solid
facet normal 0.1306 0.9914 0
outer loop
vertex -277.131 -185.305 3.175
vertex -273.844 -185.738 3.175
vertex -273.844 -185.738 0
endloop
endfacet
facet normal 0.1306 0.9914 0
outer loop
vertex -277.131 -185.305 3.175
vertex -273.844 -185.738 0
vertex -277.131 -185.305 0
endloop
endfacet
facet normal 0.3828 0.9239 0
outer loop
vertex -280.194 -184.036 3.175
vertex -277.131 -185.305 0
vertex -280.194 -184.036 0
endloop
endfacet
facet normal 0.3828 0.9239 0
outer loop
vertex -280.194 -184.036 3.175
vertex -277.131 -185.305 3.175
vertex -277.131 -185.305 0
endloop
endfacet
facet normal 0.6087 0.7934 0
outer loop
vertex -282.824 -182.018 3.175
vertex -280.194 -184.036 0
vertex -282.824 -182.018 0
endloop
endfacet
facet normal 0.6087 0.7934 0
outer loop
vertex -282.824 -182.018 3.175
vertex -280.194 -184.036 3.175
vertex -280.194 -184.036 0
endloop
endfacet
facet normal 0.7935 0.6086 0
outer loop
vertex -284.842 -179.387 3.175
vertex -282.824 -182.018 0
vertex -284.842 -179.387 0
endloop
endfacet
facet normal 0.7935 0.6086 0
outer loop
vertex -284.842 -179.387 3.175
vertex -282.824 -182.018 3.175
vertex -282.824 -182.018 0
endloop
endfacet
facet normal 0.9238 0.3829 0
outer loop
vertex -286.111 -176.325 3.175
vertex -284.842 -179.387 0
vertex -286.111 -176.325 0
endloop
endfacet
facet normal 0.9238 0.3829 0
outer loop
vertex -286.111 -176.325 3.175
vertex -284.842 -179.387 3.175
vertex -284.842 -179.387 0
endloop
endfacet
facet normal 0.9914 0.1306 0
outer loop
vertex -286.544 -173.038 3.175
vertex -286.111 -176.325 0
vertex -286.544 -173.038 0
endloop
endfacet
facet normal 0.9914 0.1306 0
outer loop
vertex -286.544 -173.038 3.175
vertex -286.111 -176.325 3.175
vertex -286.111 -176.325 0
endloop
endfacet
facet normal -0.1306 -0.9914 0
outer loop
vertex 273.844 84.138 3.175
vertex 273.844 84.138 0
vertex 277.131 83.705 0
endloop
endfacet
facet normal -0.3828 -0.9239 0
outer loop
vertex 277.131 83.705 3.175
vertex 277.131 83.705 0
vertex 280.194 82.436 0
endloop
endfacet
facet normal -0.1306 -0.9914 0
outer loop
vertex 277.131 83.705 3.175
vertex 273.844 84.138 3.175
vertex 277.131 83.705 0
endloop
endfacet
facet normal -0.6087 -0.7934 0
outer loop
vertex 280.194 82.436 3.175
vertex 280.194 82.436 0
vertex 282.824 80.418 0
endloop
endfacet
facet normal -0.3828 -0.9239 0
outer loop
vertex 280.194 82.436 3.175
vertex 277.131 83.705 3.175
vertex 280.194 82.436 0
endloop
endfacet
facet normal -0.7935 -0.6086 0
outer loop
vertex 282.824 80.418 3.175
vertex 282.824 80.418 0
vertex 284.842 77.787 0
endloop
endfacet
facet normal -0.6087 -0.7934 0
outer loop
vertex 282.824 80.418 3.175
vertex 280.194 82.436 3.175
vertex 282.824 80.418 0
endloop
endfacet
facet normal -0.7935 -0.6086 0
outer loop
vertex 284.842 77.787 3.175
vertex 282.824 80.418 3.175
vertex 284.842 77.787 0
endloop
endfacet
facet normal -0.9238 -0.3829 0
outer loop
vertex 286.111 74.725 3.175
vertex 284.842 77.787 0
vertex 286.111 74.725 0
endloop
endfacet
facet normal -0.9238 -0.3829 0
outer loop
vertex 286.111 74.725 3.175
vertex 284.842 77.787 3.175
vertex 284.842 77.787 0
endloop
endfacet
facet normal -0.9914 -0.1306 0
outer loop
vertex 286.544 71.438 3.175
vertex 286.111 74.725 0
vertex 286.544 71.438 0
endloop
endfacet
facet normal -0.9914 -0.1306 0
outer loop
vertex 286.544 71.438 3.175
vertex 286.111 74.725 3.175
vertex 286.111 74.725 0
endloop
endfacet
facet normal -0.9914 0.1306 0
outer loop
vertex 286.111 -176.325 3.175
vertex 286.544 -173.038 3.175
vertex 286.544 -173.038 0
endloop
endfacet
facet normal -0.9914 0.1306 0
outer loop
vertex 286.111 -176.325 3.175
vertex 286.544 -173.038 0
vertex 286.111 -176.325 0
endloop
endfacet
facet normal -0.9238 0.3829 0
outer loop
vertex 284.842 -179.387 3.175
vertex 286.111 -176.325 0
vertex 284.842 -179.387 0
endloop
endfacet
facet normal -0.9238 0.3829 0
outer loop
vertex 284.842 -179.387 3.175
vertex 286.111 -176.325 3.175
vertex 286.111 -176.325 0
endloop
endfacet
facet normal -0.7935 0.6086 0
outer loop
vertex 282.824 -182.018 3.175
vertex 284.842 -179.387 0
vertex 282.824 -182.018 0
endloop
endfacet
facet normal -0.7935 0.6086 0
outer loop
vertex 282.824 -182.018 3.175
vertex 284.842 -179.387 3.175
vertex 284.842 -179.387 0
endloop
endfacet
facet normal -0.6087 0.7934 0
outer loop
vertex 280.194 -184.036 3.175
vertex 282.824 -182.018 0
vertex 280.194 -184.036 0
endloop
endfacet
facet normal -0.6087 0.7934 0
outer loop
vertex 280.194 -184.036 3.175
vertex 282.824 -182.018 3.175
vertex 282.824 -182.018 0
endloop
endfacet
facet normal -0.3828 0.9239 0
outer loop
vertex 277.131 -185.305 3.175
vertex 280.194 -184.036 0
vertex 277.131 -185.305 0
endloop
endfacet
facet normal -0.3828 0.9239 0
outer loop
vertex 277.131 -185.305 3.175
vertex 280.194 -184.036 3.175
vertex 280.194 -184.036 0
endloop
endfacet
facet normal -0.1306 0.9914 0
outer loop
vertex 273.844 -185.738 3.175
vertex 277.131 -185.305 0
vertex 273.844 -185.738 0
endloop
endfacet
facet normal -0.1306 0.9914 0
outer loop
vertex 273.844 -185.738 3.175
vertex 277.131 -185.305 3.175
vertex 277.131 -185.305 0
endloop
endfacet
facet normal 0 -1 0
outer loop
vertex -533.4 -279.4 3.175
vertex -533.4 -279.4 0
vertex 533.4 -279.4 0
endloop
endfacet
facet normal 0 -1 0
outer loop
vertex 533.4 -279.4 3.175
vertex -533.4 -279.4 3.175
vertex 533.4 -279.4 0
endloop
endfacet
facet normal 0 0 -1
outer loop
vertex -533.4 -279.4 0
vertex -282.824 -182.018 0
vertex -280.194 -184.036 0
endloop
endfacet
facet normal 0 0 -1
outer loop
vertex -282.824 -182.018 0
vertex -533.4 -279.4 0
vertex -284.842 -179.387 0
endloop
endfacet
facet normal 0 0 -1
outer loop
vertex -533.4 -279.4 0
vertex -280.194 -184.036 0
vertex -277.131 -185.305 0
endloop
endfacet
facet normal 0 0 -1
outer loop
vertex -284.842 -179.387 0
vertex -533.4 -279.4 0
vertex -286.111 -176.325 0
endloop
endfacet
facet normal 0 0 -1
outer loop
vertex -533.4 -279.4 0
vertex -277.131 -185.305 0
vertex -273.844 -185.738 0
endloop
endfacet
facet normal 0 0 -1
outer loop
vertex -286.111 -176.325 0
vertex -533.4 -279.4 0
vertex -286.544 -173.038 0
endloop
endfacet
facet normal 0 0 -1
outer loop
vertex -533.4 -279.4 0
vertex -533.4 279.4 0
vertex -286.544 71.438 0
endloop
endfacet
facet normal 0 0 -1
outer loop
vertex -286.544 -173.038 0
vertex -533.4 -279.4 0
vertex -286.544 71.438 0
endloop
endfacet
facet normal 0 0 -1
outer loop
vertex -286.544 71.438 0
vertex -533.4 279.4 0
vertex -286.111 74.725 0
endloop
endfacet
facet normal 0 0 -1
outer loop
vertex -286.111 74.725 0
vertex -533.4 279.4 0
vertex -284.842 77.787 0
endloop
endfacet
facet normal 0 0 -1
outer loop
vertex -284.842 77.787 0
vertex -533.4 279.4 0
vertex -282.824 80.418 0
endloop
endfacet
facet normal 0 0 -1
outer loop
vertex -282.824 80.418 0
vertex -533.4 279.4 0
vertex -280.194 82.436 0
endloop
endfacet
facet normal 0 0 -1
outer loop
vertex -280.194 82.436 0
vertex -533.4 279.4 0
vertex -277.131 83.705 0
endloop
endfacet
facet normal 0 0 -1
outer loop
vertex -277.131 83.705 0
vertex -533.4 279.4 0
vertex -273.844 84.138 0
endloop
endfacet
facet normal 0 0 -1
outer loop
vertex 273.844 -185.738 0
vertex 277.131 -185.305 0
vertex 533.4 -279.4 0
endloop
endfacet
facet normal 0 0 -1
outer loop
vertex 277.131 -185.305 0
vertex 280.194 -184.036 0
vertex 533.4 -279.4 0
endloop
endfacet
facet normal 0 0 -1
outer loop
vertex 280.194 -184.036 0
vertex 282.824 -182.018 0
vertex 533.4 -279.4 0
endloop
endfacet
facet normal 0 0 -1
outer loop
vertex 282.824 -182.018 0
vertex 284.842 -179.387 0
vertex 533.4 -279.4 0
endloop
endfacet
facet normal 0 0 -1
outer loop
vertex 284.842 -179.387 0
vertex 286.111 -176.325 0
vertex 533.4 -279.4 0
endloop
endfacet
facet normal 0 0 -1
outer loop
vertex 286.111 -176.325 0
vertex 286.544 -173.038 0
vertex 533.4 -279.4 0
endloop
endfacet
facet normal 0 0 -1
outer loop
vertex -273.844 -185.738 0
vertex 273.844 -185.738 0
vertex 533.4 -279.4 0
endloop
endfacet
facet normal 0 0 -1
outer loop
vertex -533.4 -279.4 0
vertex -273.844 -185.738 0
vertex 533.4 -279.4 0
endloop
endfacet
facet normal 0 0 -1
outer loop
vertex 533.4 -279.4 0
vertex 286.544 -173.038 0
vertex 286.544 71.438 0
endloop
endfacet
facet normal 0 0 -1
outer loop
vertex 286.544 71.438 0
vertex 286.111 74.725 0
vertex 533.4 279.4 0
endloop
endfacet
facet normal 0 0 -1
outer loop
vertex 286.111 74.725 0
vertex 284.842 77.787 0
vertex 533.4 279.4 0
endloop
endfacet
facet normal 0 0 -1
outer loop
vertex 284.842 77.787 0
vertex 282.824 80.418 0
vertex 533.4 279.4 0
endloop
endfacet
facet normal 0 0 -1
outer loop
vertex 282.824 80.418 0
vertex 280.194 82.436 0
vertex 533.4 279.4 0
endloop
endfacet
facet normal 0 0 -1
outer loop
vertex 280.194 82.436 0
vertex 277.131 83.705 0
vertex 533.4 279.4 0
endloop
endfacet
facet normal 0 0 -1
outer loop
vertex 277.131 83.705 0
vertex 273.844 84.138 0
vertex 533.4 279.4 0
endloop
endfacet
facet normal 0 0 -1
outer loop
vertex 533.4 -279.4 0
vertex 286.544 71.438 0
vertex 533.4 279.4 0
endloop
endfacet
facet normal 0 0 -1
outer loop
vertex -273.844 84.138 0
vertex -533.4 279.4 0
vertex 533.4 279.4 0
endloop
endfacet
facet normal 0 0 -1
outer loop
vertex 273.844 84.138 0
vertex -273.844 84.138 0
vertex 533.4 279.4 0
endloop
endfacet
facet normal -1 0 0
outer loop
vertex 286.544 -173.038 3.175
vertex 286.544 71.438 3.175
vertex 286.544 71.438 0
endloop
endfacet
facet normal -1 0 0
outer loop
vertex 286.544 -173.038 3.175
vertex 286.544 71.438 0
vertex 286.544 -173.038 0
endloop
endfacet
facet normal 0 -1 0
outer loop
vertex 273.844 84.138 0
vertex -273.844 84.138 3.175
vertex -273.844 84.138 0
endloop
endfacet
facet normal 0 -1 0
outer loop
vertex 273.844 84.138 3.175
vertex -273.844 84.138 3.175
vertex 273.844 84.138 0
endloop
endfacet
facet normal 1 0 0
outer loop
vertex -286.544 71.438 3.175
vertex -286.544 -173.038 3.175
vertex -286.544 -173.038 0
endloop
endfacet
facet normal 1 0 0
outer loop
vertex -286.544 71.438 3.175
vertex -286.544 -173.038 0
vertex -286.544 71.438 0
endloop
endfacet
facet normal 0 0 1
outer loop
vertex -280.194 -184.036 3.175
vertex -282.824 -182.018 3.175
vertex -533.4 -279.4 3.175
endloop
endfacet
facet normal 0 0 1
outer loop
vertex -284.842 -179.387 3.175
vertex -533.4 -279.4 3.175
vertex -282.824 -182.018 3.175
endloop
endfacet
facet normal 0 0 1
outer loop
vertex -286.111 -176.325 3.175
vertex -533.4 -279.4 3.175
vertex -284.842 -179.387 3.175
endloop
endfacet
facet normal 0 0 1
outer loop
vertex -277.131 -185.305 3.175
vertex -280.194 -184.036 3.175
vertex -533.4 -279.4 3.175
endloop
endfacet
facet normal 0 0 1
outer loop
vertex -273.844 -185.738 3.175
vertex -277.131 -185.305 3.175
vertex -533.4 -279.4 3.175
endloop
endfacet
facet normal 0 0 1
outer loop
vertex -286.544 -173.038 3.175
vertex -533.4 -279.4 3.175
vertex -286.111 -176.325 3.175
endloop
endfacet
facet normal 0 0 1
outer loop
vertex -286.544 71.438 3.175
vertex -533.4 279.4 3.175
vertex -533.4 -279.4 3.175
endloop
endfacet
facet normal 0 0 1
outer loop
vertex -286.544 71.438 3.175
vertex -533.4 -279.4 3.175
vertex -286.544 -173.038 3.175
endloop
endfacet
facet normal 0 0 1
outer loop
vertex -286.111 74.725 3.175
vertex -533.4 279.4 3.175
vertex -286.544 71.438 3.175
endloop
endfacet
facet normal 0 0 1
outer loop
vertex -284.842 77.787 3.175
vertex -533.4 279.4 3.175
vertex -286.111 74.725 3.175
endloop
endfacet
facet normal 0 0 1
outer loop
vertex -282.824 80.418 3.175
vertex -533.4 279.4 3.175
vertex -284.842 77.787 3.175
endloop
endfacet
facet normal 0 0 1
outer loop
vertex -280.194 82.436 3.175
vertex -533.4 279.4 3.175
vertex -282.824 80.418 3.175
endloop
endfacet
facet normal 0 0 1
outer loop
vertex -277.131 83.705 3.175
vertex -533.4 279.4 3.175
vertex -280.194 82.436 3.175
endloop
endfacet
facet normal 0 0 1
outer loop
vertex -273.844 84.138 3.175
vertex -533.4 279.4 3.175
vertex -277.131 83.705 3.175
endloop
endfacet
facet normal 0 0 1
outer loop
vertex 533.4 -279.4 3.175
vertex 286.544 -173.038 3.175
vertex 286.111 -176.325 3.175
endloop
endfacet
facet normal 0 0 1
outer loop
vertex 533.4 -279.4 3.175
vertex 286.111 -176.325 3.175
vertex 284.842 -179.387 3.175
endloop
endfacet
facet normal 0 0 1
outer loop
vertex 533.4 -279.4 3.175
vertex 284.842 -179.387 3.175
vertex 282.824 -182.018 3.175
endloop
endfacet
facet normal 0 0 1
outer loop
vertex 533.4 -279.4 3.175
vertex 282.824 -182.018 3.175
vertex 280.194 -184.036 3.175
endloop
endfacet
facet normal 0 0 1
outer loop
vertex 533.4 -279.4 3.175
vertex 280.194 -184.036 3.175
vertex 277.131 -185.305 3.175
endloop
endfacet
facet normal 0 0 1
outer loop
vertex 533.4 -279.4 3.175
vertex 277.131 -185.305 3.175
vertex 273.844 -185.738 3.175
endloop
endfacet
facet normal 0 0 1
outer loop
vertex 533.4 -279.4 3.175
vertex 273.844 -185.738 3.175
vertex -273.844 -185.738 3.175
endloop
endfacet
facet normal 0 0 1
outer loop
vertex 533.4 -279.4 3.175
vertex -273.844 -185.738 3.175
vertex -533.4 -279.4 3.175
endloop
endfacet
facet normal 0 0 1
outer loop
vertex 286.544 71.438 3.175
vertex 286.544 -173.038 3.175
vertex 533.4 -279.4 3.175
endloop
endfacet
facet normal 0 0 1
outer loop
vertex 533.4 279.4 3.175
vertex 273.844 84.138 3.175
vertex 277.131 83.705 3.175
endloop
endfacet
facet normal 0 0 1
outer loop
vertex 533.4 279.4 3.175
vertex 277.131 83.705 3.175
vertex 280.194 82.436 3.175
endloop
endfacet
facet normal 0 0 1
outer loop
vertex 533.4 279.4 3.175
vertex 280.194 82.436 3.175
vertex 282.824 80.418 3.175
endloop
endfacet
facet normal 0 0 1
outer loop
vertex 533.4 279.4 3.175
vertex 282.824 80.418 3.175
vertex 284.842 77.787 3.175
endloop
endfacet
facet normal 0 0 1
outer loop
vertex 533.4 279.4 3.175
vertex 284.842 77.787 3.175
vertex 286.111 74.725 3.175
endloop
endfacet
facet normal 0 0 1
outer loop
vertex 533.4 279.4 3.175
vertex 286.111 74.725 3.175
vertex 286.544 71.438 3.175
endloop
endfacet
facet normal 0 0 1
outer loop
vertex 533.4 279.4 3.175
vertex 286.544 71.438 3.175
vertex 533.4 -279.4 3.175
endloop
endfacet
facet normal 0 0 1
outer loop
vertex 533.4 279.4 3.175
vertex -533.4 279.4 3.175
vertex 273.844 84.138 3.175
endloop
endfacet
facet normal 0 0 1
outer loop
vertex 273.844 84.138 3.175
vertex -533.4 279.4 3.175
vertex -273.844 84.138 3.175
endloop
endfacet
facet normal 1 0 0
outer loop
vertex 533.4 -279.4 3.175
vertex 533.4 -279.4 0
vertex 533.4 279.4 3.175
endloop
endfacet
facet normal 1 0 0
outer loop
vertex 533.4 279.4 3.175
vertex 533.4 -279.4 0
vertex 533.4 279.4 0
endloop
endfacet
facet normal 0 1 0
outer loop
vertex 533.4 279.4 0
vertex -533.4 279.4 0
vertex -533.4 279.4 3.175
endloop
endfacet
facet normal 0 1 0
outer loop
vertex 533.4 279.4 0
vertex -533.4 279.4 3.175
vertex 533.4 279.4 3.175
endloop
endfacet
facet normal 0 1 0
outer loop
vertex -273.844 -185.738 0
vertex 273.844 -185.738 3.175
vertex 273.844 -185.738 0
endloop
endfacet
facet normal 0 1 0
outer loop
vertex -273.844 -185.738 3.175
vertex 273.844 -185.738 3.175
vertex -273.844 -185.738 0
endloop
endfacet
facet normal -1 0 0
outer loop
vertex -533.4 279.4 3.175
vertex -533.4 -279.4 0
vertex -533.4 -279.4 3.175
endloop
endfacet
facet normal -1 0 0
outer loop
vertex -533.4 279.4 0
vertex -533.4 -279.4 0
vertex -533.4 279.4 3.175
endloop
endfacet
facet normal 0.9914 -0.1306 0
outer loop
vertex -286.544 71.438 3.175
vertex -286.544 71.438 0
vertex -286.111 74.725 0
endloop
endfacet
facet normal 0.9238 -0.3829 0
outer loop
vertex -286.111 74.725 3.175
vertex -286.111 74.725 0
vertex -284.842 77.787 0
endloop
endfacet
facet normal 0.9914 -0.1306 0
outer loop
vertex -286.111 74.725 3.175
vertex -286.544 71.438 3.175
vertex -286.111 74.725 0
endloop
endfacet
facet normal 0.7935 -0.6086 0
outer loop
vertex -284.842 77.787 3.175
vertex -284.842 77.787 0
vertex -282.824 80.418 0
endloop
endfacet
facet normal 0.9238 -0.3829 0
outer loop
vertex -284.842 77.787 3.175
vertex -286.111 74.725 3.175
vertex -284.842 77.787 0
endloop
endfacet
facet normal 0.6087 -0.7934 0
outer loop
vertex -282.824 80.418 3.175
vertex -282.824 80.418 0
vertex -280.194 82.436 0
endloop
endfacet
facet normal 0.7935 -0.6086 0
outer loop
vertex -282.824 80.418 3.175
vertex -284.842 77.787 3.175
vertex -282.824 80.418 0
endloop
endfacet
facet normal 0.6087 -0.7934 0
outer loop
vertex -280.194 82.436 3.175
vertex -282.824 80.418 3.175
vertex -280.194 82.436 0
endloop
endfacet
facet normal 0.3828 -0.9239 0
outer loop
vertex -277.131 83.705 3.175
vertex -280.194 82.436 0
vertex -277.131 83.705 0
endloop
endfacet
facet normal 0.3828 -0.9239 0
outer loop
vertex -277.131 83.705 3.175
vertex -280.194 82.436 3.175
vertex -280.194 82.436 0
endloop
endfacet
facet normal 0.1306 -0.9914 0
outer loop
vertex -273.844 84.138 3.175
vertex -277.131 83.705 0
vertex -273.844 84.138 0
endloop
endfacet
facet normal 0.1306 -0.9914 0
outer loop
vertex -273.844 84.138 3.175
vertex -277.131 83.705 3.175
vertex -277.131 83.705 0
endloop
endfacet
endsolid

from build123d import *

# Parameters (mm, degrees)
SKETCH1_W           = 1066.8
SKETCH1_H           = 558.8
BOSS_EXTRUDE1_DEPTH = 3.175
CUT_EXTRUDE1_REACH  = 5.175


with BuildPart() as part:
    # Sketch1 → Boss-Extrude1 (new body)
    with BuildSketch(Plane.XY):
        Rectangle(SKETCH1_W, SKETCH1_H)
    extrude(amount=BOSS_EXTRUDE1_DEPTH)

    # Sketch2 → Cut-Extrude1 (cut, up to next)
    with BuildSketch(Plane.XY.offset(3.175), mode=Mode.PRIVATE) as cut_extrude1_sk1:
        with BuildLine():
            Line((-273.84375, 84.1375), (273.84375, 84.1375))
            ThreePointArc((273.84375, 84.1375), (282.824006121, 80.417756121), (286.54375, 71.4375))
            Line((286.54375, 71.4375), (286.54375, -173.0375))
            ThreePointArc((286.54375, -173.0375), (282.824006121, -182.017756121), (273.84375, -185.7375))
            Line((273.84375, -185.7375), (-273.84375, -185.7375))
            ThreePointArc((-273.84375, -185.7375), (-282.824006121, -182.017756121), (-286.54375, -173.0375))
            Line((-286.54375, -173.0375), (-286.54375, 71.4375))
            ThreePointArc((-286.54375, 71.4375), (-282.824006121, 80.417756121), (-273.84375, 84.1375))
        make_face()
    cut_extrude1_tool1 = extrude(cut_extrude1_sk1.sketch, amount=-CUT_EXTRUDE1_REACH, mode=Mode.PRIVATE) & part.part
    add(cut_extrude1_tool1.solids().sort_by_distance((0, -50.8, 3.175))[0], mode=Mode.SUBTRACT)


solid = part.part
